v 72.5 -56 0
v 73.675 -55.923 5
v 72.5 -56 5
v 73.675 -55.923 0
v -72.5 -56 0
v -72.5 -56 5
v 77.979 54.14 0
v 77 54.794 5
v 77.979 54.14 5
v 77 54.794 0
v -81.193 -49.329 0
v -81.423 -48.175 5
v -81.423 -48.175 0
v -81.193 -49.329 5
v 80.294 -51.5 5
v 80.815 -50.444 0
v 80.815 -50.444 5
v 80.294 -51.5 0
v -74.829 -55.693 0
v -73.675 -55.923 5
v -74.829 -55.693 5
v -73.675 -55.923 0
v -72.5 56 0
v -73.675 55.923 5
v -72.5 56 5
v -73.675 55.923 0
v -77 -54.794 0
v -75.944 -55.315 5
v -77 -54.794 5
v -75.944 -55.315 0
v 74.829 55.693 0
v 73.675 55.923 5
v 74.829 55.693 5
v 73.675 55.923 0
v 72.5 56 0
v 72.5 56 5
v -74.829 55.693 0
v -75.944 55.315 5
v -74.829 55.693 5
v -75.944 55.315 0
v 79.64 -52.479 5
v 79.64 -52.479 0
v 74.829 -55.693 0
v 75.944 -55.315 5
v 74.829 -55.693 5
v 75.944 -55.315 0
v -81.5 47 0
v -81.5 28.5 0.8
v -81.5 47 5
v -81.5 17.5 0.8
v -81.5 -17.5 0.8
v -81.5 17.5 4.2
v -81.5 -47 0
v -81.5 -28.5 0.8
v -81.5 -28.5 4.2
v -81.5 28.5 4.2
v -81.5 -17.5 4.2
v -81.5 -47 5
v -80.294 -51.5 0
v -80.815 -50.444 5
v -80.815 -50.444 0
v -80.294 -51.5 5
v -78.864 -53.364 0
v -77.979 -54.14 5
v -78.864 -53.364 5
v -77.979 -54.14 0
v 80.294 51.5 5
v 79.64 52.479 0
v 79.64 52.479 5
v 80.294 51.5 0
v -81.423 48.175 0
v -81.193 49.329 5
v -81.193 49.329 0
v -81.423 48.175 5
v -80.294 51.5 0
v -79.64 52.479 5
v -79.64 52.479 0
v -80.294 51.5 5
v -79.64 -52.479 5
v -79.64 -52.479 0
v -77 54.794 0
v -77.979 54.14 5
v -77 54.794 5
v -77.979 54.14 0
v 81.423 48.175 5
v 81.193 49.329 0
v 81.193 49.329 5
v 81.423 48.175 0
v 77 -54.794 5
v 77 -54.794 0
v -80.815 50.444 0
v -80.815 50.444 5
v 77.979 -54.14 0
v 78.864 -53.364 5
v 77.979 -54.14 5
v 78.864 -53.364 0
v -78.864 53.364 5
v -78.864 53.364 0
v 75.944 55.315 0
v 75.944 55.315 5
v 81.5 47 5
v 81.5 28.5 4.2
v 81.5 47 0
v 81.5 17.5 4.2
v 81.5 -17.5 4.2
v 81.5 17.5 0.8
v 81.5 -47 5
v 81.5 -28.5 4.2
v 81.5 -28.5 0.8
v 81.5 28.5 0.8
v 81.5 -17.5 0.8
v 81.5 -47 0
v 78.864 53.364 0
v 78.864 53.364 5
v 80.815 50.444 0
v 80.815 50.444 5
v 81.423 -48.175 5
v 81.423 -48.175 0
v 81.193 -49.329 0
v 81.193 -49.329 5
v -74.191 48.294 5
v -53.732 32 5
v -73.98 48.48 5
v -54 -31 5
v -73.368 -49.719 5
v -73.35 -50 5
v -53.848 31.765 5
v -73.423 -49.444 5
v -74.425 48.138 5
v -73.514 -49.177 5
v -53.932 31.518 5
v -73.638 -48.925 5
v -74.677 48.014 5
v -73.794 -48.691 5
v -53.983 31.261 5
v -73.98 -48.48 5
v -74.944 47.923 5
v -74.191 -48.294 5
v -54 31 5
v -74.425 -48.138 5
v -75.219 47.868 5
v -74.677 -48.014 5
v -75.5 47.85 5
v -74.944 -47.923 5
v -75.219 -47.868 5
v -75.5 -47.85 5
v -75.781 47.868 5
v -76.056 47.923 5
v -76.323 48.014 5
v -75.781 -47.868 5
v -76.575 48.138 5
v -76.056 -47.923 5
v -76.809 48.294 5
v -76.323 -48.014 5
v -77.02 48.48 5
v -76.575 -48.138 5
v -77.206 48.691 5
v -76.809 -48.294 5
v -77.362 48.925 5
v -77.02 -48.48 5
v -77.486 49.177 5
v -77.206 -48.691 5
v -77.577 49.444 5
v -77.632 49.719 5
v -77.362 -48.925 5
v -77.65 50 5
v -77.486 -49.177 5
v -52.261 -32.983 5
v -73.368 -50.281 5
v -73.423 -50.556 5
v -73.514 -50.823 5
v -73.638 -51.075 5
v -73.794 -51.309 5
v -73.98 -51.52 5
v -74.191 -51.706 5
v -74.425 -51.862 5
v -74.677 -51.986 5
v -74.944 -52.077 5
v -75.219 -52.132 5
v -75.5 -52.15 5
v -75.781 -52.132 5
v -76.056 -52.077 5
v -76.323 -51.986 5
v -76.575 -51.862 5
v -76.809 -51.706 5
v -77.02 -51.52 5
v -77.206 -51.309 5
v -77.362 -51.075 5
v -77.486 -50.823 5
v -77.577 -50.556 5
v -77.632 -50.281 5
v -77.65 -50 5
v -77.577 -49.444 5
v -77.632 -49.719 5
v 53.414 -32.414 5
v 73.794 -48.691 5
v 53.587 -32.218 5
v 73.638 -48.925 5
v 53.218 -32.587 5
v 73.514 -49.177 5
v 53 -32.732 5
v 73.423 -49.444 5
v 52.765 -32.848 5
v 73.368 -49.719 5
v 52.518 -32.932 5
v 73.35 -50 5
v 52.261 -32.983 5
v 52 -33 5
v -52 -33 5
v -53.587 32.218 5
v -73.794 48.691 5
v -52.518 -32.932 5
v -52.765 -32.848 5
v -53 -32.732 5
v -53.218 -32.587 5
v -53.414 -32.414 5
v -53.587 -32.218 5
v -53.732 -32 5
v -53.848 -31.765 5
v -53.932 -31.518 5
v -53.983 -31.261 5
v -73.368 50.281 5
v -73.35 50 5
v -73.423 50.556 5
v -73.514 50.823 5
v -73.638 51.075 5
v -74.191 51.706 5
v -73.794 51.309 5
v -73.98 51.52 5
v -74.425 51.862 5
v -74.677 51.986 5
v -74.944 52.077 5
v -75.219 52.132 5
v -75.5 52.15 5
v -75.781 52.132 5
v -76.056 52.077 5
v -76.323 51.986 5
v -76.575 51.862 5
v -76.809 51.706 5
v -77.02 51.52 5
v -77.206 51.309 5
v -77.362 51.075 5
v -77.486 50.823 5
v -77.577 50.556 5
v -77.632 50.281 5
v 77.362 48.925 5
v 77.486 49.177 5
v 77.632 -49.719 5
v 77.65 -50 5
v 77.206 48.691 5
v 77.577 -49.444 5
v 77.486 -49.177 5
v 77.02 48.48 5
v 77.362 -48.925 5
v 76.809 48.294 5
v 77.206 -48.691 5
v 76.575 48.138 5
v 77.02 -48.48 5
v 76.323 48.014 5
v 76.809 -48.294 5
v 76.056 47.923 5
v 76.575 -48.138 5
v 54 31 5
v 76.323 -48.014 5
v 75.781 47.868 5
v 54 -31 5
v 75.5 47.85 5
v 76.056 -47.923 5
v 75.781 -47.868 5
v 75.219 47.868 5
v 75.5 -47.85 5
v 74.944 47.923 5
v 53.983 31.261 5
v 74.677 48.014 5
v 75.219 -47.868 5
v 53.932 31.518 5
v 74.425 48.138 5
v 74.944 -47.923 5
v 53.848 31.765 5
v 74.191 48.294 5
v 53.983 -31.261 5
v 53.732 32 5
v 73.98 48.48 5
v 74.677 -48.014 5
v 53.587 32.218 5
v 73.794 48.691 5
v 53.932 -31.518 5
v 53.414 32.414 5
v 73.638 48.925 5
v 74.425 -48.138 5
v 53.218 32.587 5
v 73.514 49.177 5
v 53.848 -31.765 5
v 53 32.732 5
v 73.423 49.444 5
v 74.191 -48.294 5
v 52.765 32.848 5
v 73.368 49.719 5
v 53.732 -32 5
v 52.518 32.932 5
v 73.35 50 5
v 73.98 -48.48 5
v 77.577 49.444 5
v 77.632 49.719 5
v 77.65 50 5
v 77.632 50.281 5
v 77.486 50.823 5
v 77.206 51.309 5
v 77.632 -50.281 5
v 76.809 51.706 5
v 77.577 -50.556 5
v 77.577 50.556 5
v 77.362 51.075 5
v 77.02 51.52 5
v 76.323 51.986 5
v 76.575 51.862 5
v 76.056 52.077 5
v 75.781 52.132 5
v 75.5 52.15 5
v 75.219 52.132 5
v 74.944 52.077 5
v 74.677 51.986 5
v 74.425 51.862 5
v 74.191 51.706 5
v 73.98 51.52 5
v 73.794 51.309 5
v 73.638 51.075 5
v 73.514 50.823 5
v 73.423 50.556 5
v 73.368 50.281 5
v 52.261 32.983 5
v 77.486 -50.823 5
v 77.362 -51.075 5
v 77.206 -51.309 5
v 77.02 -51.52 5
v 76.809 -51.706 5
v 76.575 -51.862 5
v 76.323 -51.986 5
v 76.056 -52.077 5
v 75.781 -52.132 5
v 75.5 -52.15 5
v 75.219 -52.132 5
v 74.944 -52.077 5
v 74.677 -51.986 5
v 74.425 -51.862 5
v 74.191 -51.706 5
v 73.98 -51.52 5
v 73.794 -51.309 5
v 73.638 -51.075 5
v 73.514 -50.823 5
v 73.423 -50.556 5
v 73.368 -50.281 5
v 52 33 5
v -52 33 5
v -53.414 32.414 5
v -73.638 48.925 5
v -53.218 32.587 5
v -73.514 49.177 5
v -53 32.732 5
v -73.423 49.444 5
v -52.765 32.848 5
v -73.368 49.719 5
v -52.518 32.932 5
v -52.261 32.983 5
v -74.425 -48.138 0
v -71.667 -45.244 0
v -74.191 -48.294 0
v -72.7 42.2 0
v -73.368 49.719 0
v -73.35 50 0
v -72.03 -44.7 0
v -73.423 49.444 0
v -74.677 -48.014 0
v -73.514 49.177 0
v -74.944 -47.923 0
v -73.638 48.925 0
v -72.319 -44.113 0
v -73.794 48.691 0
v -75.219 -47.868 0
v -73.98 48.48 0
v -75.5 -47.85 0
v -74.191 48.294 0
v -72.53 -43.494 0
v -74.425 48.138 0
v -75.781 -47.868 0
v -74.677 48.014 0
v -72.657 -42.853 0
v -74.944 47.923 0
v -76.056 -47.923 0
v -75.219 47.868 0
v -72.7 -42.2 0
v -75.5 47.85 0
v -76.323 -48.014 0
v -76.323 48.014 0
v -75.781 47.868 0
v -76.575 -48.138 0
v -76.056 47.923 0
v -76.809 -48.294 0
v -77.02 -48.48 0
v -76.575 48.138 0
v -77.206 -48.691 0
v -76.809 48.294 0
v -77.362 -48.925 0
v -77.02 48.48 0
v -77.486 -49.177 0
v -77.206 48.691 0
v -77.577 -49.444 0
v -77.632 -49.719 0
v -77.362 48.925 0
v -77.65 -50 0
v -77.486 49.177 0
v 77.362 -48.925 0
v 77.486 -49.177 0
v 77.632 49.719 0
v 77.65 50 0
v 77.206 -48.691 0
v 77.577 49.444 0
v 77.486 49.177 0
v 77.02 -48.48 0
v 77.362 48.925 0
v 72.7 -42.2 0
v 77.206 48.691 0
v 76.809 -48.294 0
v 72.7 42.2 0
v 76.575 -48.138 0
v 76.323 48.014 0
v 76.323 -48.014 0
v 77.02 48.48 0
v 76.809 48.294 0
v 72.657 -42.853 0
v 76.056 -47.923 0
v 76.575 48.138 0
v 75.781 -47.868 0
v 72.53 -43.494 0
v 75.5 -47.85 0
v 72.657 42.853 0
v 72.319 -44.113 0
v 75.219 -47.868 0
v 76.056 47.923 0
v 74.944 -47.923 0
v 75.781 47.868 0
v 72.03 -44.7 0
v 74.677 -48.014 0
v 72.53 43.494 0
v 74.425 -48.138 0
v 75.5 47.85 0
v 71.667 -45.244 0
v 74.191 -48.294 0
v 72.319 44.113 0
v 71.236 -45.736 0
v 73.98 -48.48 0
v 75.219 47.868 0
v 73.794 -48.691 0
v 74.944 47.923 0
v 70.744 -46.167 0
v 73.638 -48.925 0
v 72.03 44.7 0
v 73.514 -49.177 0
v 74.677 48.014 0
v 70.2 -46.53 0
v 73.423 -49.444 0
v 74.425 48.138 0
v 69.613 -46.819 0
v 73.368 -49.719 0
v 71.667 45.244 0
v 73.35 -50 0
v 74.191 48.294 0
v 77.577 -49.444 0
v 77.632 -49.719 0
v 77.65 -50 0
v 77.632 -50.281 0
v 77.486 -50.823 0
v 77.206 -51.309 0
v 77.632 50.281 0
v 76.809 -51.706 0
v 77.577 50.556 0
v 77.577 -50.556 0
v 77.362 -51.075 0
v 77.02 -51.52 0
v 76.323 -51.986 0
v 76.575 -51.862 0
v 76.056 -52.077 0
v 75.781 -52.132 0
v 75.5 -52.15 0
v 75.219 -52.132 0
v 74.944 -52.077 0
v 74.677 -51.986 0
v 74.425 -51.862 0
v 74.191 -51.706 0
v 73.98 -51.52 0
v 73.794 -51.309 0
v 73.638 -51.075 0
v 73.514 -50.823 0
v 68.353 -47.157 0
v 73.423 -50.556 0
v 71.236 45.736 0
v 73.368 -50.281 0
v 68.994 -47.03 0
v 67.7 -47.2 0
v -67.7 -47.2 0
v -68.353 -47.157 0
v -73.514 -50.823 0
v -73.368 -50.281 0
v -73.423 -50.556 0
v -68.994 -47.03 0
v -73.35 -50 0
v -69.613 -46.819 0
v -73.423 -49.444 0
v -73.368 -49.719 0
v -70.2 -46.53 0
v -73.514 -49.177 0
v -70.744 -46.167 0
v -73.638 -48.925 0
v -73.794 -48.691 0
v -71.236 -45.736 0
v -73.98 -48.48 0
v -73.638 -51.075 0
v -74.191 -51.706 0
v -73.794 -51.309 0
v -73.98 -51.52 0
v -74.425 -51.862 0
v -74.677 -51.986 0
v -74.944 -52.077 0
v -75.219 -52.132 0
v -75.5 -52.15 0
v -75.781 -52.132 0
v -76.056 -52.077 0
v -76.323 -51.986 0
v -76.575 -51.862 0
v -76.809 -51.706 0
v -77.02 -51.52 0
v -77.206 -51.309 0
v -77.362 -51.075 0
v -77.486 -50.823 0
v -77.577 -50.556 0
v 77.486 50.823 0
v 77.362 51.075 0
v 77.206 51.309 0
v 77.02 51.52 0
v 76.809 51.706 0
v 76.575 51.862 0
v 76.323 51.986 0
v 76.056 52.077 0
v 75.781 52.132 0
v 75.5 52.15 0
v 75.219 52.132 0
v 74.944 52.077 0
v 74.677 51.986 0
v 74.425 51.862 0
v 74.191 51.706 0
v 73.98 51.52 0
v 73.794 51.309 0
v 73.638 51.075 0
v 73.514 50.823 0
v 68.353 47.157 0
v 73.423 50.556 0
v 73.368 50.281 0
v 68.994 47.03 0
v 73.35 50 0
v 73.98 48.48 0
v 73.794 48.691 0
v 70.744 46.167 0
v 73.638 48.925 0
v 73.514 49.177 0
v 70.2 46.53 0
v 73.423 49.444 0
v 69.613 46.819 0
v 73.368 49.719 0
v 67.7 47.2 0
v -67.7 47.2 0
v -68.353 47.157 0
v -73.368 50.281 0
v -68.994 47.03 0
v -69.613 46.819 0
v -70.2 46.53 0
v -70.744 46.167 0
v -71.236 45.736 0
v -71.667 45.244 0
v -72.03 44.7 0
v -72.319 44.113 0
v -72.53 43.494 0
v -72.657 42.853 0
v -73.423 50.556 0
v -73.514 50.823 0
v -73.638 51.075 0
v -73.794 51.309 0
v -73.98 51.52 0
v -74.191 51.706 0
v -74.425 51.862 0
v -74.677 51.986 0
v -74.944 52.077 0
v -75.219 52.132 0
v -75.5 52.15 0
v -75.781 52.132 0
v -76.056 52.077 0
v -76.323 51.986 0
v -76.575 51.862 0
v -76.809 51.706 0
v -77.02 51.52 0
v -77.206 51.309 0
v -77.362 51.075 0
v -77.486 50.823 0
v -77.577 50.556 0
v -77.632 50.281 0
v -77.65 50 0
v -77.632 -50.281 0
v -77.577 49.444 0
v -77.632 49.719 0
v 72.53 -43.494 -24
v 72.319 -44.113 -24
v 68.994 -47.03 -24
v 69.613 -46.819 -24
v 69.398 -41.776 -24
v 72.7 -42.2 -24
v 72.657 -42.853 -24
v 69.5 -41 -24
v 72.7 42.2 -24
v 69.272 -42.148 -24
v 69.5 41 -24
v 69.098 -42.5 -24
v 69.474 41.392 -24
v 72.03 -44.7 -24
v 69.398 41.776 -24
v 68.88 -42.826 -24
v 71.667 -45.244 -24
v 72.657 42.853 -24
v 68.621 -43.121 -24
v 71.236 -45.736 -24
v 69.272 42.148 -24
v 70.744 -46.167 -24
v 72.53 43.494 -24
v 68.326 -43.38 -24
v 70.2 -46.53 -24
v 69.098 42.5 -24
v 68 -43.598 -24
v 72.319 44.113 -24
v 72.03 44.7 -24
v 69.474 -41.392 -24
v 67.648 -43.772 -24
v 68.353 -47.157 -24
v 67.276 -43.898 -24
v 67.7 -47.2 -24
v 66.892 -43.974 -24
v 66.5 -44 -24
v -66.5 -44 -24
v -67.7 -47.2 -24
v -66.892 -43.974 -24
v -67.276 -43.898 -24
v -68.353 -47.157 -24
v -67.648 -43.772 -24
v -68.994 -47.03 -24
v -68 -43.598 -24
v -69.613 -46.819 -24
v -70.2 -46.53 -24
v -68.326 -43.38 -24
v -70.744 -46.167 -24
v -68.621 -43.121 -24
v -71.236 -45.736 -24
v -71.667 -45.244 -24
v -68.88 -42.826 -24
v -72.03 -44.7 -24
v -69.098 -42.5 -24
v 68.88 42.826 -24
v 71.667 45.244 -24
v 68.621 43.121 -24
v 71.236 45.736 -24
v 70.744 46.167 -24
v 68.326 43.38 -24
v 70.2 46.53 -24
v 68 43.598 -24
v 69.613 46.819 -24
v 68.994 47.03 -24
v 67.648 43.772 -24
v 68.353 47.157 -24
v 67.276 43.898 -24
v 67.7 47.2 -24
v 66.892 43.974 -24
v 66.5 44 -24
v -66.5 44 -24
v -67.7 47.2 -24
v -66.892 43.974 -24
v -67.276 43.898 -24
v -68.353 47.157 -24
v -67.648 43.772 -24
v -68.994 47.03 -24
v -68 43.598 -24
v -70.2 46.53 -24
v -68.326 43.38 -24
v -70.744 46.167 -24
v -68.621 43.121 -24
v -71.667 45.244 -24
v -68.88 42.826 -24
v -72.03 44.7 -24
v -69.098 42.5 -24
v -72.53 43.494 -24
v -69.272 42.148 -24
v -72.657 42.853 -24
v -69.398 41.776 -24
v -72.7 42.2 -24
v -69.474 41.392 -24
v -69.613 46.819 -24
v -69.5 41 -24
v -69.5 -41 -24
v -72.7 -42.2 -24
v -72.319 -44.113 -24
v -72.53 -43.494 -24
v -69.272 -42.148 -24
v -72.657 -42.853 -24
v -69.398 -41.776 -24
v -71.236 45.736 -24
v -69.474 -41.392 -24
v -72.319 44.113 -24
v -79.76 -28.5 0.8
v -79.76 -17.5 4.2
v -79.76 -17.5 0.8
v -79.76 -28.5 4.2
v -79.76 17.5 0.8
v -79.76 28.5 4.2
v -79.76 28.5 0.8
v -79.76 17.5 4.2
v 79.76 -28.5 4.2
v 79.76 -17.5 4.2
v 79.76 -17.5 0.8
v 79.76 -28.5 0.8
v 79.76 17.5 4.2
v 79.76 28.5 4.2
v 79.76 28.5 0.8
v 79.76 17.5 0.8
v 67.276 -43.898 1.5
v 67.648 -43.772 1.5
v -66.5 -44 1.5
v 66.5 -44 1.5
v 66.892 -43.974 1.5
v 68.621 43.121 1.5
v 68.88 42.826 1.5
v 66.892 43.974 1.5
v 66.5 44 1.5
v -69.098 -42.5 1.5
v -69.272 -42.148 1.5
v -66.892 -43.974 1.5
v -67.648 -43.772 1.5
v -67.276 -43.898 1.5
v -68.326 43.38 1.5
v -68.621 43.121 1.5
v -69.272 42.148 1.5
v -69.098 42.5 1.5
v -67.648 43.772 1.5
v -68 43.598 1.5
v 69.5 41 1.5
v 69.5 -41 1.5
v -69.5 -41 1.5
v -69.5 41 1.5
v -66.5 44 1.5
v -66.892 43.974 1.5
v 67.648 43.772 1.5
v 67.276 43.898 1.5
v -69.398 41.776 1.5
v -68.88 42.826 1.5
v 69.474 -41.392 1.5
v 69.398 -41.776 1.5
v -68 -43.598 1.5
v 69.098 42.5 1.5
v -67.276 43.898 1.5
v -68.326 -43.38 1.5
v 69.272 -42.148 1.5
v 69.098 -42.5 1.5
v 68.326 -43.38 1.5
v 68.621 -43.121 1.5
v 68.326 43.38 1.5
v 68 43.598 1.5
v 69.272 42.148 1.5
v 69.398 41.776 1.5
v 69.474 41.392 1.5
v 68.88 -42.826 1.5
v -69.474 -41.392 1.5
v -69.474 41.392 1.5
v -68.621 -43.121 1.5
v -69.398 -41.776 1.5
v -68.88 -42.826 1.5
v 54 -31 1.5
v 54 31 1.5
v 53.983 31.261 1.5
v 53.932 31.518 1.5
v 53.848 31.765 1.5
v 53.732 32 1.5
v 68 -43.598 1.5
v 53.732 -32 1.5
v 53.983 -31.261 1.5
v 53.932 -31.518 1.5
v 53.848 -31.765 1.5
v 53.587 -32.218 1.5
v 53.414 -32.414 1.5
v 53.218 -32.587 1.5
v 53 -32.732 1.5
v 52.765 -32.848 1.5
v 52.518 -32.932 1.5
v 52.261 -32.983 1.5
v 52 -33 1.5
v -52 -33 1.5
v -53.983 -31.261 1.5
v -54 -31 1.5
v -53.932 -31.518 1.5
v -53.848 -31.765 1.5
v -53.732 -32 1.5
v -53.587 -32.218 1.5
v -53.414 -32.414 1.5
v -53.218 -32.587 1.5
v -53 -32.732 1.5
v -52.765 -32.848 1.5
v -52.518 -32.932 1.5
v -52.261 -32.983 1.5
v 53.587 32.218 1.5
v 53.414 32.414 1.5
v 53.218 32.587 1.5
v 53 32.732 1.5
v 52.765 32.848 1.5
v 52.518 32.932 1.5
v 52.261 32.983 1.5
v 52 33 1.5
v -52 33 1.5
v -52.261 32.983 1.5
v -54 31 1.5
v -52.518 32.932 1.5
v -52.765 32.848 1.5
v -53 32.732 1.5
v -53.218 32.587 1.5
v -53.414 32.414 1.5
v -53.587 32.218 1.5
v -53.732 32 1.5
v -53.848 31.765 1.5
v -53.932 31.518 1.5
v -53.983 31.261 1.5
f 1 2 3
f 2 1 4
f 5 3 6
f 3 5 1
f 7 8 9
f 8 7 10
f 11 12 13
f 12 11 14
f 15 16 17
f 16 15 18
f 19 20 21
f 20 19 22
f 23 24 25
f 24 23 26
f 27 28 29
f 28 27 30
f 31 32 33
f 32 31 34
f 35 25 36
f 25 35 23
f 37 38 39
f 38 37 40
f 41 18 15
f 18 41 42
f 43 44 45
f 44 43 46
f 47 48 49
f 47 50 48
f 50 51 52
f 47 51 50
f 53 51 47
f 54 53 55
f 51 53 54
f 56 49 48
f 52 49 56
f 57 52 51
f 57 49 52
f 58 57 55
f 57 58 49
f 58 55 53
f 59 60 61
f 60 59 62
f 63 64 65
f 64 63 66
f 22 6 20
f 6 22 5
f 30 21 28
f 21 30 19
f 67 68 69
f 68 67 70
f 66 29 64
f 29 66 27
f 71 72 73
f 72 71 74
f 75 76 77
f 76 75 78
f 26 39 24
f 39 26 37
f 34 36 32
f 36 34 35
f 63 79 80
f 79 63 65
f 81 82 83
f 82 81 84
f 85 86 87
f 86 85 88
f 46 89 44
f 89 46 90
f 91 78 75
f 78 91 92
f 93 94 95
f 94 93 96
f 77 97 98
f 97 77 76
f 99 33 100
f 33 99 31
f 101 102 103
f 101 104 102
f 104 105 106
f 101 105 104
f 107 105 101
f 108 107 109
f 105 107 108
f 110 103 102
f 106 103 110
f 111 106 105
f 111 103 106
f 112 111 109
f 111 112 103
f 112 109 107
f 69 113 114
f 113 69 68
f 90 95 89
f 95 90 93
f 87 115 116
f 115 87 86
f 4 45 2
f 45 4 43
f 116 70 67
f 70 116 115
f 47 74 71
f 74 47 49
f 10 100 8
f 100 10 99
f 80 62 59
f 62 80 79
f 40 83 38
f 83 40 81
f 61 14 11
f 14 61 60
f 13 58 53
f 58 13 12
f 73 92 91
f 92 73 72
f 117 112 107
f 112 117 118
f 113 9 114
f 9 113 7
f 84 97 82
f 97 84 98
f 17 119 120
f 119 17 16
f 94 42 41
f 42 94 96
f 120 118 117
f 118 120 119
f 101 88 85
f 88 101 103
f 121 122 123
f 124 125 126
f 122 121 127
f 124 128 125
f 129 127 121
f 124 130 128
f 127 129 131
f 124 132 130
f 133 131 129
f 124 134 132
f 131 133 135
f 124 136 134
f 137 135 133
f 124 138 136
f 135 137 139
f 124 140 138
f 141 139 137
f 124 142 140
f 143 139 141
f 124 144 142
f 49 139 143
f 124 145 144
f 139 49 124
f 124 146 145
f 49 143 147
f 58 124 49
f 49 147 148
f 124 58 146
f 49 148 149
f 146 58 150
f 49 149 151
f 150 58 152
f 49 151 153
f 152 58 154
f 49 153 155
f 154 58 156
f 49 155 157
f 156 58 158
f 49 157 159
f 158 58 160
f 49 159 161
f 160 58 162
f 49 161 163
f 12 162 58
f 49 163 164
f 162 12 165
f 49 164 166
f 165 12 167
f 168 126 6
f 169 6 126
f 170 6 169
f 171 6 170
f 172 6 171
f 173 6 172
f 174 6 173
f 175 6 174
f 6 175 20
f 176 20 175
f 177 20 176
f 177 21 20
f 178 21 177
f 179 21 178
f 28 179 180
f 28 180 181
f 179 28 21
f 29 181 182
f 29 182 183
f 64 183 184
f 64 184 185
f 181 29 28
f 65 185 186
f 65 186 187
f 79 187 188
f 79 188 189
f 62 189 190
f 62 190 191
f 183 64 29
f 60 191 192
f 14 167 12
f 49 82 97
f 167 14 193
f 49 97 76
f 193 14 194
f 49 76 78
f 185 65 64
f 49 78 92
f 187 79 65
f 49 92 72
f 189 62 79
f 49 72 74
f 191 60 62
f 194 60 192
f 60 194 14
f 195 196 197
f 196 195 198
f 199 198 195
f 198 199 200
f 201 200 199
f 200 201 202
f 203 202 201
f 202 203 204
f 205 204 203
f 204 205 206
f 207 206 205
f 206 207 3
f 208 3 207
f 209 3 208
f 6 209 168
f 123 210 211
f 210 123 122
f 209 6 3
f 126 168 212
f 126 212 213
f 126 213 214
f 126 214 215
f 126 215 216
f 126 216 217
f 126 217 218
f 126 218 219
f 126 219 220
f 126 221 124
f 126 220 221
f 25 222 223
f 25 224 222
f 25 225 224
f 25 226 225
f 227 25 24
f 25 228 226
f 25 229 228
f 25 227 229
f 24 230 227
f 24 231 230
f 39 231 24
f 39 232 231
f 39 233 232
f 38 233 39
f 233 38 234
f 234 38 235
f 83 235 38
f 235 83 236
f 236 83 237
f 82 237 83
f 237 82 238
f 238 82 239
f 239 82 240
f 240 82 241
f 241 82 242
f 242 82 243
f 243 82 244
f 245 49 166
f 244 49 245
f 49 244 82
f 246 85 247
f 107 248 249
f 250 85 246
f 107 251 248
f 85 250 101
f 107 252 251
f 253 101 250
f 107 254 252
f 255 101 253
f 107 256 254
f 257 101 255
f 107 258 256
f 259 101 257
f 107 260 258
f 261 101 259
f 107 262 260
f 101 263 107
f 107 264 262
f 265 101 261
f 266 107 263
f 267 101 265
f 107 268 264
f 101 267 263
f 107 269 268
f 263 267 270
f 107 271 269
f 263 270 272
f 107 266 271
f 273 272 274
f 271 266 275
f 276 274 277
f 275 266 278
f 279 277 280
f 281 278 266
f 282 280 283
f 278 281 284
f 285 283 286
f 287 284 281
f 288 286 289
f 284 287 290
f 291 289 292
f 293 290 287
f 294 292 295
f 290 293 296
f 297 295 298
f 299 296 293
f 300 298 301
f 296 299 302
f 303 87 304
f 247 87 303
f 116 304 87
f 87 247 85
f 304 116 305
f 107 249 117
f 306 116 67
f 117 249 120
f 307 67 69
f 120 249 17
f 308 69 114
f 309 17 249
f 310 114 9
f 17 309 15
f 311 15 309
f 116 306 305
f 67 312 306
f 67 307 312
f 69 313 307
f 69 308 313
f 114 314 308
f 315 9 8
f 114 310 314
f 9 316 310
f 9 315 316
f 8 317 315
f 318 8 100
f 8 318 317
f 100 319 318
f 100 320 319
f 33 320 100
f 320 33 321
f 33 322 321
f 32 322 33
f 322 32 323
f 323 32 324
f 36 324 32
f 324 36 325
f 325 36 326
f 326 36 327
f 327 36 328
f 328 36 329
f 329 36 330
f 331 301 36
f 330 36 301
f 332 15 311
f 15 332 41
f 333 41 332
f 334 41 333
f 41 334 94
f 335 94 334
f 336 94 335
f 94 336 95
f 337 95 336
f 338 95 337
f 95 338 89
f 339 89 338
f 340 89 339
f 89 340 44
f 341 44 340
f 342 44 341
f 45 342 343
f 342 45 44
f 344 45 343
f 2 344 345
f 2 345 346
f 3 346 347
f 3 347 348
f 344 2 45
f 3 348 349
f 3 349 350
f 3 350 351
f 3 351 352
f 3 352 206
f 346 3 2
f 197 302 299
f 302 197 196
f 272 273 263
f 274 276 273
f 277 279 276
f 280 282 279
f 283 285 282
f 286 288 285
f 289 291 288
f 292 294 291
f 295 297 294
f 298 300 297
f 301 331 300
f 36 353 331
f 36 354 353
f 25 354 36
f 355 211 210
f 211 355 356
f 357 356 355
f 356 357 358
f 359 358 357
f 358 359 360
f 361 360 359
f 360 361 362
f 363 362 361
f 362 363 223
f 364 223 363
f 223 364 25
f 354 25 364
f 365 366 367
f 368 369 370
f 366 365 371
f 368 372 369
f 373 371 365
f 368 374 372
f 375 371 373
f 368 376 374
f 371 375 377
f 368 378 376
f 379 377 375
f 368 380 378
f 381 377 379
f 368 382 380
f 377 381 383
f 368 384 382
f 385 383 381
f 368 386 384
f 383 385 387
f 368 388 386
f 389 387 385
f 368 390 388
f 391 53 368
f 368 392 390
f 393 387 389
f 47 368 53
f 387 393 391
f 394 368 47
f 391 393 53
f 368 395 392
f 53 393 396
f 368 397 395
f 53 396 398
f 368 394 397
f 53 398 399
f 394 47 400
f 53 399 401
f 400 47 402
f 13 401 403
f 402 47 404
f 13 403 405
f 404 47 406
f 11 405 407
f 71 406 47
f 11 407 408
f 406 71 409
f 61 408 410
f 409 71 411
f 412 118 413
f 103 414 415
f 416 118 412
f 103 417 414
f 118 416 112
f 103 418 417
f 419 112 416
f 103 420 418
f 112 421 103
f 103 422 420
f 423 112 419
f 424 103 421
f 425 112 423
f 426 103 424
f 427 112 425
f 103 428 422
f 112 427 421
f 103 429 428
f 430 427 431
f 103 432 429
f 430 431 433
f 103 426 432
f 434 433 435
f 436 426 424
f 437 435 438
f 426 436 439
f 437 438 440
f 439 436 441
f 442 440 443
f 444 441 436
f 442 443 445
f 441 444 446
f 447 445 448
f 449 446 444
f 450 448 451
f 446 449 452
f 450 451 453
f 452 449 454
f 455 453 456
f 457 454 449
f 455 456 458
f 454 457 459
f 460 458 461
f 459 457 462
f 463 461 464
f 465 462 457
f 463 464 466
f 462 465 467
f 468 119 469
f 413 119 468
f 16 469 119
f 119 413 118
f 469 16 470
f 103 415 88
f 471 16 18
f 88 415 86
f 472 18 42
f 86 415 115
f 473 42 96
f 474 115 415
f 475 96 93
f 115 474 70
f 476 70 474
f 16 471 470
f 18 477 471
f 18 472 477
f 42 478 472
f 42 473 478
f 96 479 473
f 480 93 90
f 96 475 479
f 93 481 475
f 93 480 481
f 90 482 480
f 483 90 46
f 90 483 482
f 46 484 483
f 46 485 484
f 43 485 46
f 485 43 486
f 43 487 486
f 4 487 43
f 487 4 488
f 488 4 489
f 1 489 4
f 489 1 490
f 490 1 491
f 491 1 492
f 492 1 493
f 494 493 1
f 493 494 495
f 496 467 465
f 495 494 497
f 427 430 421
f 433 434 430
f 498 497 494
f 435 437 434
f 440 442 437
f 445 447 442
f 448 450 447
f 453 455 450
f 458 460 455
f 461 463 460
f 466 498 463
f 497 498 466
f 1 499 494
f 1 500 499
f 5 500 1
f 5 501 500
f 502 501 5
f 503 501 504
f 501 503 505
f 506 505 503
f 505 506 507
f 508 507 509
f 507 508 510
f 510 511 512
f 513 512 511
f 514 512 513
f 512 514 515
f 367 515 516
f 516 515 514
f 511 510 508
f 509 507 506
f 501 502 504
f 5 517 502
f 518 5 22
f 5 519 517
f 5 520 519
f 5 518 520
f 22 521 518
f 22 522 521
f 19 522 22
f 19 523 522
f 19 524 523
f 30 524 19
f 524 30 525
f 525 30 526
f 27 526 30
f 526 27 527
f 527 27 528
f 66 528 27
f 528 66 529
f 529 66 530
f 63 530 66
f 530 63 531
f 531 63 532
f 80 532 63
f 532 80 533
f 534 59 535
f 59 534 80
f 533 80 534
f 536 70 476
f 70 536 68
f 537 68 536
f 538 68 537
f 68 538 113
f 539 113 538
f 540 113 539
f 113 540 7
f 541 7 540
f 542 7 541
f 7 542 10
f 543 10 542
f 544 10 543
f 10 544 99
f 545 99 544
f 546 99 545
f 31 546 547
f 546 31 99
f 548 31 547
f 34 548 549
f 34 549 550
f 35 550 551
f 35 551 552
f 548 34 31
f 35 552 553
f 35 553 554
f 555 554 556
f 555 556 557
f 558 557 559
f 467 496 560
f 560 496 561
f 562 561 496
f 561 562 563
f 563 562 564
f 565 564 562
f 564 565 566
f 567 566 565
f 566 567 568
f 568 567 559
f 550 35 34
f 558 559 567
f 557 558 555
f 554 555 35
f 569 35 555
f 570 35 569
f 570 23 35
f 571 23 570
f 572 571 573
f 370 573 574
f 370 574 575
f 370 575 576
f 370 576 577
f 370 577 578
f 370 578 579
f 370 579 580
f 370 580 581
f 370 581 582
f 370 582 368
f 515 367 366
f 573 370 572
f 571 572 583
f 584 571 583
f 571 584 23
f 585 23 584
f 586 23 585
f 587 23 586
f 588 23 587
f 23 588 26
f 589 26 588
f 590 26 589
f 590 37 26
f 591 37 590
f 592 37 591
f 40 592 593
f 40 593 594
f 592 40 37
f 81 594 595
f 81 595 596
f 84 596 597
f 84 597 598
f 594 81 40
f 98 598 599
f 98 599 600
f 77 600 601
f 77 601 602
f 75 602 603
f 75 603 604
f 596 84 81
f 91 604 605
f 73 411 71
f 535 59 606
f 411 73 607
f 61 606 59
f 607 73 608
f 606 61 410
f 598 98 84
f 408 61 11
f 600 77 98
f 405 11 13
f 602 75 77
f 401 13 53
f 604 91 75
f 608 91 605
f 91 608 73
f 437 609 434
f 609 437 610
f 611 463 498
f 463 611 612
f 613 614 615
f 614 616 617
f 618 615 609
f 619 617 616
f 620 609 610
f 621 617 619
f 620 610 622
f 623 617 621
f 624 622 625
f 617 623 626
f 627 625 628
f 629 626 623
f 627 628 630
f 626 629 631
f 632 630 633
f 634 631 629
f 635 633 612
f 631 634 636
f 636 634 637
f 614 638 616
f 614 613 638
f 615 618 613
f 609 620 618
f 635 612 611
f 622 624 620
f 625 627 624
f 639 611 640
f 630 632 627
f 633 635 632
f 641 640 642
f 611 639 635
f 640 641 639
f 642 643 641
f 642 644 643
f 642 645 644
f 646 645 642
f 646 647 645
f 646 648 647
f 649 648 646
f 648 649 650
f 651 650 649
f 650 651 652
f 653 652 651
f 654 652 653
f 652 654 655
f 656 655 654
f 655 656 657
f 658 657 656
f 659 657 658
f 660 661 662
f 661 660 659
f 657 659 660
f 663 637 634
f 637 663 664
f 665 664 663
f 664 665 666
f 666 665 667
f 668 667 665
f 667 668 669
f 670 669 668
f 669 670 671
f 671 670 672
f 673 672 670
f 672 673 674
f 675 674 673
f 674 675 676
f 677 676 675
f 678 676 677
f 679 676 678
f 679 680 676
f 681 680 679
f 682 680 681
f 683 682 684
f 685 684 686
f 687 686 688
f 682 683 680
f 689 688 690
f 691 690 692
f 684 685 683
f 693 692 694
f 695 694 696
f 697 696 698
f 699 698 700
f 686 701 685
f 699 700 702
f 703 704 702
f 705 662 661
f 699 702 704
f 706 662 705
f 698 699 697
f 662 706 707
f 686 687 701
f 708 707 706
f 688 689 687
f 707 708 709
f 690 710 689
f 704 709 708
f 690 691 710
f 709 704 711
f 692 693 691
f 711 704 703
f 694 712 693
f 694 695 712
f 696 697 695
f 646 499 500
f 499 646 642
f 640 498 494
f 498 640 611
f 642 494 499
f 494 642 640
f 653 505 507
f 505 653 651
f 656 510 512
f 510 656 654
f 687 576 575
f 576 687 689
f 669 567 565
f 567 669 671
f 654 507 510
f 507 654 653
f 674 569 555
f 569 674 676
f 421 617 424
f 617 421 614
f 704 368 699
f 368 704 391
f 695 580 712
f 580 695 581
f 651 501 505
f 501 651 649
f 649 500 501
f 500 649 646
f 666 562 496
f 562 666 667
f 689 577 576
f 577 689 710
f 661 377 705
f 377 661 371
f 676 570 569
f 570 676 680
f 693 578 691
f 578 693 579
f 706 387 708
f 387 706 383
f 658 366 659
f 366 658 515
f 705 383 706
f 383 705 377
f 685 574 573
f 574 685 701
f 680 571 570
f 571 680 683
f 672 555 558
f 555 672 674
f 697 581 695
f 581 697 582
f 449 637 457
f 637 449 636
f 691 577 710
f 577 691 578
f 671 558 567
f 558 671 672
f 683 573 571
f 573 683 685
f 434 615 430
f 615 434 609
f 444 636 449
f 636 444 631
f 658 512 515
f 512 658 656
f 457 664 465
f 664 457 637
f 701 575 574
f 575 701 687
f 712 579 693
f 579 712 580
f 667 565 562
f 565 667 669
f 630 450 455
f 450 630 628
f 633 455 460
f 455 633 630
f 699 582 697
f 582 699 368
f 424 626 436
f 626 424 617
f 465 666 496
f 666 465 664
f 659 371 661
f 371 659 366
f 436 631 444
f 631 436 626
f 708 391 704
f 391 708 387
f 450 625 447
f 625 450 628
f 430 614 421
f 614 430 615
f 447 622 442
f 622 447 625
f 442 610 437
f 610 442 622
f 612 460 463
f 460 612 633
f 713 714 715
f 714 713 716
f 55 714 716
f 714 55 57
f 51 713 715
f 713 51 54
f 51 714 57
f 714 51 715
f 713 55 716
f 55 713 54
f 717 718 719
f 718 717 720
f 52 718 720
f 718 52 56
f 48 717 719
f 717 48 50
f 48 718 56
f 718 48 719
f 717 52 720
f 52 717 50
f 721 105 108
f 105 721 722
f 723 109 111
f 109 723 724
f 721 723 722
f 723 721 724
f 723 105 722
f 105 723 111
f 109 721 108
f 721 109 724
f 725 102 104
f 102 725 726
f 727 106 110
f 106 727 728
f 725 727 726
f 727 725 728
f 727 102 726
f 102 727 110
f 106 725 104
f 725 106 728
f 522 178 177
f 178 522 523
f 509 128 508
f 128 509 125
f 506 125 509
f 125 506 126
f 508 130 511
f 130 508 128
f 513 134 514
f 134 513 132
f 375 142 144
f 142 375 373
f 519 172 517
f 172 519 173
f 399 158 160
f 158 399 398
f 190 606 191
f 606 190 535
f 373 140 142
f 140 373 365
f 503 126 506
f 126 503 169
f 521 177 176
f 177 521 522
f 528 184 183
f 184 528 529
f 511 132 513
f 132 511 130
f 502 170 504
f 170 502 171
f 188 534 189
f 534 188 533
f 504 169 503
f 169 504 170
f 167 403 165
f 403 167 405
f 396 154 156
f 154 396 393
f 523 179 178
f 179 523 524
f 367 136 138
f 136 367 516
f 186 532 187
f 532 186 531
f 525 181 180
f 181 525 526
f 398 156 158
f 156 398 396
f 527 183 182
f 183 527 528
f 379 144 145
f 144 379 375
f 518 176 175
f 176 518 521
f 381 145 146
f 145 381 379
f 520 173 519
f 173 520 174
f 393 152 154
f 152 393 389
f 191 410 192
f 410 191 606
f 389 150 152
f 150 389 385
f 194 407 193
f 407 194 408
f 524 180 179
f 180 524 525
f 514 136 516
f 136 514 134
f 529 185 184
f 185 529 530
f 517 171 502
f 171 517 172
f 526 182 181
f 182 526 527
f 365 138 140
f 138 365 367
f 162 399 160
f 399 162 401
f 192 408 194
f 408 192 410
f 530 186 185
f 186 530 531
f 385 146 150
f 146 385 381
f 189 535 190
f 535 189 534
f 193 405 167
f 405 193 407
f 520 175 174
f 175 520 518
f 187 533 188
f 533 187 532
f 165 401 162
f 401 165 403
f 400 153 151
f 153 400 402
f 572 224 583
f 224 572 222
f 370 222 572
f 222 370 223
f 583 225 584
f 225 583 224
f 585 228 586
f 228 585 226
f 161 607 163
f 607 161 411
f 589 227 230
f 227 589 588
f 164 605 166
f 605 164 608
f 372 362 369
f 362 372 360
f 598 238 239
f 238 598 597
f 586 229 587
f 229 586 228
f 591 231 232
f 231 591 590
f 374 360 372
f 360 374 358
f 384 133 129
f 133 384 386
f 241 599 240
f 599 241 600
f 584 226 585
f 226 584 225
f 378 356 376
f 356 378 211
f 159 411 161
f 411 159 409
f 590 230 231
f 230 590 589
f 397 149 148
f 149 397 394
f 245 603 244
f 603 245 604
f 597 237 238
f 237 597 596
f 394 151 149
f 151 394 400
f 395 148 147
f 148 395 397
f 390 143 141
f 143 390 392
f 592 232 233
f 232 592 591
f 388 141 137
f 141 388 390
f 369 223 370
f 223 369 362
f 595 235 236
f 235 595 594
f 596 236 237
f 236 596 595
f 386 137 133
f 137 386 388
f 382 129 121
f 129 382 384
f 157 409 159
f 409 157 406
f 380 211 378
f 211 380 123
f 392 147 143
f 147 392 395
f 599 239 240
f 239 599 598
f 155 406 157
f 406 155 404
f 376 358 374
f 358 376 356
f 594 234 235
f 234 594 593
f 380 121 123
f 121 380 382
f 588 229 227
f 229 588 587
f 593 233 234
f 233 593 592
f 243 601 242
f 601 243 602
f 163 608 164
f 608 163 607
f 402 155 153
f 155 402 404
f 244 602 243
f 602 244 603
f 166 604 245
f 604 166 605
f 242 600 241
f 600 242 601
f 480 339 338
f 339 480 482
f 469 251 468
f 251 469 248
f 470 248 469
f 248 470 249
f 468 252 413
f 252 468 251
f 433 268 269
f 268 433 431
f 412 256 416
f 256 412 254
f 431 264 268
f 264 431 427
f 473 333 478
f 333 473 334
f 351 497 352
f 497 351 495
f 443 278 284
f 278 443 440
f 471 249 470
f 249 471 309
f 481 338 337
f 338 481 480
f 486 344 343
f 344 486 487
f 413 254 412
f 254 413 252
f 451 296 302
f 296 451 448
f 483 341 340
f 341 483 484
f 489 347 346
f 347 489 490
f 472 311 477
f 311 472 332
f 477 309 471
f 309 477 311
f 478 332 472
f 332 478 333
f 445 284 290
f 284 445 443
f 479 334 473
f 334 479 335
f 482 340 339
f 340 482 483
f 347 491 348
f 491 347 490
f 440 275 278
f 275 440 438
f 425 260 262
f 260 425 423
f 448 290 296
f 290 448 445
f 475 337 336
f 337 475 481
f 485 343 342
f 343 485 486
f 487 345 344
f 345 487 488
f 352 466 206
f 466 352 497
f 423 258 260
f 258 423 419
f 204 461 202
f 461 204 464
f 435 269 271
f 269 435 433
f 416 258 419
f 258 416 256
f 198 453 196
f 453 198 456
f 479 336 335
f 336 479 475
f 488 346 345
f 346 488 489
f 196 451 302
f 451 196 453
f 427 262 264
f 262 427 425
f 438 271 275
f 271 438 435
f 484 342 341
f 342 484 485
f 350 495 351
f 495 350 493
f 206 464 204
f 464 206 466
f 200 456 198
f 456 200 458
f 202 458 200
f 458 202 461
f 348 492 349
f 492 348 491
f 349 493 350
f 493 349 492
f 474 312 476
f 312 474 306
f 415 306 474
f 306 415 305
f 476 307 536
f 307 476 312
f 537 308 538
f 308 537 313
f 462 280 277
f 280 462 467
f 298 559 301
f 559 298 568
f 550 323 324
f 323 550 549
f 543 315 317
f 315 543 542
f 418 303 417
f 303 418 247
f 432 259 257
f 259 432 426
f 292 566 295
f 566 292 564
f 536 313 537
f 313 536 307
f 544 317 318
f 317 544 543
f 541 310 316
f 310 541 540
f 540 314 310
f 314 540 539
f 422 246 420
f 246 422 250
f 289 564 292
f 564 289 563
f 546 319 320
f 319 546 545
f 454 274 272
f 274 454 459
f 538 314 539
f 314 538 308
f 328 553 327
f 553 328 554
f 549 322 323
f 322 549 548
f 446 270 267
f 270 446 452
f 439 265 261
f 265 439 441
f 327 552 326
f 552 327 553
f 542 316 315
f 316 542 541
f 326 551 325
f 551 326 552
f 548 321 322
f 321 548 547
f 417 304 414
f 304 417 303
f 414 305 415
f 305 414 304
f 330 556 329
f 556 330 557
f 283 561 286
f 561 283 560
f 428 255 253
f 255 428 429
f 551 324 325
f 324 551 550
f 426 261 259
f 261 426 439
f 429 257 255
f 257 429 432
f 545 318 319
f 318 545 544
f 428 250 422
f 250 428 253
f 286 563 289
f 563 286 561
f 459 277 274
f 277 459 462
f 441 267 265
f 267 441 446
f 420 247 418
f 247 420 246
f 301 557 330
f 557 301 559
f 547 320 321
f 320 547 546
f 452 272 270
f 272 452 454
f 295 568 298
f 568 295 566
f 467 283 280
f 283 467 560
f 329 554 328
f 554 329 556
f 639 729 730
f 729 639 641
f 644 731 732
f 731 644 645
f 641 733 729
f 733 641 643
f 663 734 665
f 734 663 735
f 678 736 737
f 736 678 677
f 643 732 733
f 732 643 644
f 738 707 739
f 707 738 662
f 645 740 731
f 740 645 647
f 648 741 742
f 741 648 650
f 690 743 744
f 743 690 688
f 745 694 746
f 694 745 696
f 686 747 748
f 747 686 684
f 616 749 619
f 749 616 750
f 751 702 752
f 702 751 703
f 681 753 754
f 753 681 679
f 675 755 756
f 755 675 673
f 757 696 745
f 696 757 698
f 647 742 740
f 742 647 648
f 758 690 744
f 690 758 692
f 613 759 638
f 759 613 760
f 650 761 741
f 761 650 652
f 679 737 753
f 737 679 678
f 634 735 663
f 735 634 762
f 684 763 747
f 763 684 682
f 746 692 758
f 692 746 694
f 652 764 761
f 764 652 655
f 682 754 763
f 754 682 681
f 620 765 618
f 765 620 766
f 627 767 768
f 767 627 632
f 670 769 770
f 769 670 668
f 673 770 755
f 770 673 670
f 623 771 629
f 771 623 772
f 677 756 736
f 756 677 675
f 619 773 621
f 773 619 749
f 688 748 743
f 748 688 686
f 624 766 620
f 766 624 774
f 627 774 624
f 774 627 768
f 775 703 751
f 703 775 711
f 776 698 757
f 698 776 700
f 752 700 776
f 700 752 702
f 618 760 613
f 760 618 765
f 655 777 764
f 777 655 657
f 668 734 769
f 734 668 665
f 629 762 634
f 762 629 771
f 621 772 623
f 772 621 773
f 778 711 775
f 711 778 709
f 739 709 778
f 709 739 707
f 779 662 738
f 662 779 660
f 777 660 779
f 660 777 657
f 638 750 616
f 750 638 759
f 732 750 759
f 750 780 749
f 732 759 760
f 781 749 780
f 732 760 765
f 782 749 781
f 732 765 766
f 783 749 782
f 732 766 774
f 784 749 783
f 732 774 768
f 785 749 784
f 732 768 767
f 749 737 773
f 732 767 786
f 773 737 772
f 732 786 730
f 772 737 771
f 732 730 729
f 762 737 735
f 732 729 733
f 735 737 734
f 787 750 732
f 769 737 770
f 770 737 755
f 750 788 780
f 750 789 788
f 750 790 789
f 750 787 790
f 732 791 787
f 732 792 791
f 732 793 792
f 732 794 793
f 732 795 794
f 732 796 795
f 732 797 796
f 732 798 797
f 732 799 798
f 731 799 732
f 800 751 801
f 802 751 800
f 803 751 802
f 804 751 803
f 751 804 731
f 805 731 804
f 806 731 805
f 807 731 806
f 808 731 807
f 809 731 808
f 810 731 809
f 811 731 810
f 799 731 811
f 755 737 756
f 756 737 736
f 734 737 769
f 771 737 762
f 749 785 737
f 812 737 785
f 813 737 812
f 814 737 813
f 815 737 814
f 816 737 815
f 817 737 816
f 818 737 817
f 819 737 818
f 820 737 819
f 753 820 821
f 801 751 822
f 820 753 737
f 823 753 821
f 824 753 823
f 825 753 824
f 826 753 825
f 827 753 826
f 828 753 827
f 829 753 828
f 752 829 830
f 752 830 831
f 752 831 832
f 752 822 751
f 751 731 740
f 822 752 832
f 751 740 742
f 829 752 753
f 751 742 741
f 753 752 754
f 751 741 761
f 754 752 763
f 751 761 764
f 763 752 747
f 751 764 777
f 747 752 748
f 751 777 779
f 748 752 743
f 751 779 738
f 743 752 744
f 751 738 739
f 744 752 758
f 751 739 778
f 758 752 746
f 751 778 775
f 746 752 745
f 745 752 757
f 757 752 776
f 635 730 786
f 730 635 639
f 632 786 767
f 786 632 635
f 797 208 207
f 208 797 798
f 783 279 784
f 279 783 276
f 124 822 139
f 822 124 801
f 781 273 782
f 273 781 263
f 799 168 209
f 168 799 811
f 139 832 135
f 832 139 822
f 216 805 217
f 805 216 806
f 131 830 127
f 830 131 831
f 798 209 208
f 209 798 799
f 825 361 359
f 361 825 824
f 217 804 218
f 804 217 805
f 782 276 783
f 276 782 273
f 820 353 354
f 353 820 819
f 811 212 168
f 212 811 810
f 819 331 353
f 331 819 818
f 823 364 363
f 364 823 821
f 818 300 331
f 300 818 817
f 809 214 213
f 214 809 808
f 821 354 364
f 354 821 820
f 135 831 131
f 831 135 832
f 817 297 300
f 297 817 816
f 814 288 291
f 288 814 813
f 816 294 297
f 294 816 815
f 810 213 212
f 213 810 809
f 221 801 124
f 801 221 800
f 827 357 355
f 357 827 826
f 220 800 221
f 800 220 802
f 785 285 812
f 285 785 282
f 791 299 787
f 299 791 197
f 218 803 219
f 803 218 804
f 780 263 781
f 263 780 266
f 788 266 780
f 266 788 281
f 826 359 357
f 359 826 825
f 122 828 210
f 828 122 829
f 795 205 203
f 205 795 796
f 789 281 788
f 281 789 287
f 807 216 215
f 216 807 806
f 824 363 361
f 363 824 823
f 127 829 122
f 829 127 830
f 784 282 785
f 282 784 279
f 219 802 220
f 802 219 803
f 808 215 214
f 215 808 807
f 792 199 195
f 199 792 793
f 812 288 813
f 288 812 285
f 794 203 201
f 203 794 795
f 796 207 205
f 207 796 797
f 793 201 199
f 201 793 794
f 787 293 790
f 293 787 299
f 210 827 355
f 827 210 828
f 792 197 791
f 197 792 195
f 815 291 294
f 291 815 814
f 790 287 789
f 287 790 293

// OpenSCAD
/* VMAX in-dash mount V1: provisional mm dimensions; verify actual hardware. */
$fn=48;part="mount";
module_w=137;module_h=86;visible_w=108;visible_h=66;
fit_clearance=1;bezel_border=12;bezel_thick=5;
sleeve_depth=24;sleeve_wall=3.2;corner_r=9;
snap_offset_y=23;snap_slot_height=11;snap_slot_depth=1.6;snap_slot_width=3.4;
mount_hole_d=4.3;mount_inset=6;
outer_w=module_w+2*(fit_clearance+bezel_border);
outer_h=module_h+2*(fit_clearance+bezel_border);
sleeve_w=module_w+2*(fit_clearance+sleeve_wall);
sleeve_h=module_h+2*(fit_clearance+sleeve_wall);
module rr(w,h,r){offset(r=r)square([w-2*r,h-2*r],center=true);}
module mount(){difference(){union(){
 linear_extrude(height=bezel_thick)rr(outer_w,outer_h,corner_r);
 translate([0,0,-sleeve_depth])linear_extrude(height=sleeve_depth)rr(sleeve_w,sleeve_h,5);
}
translate([0,0,-sleeve_depth-.1])linear_extrude(height=sleeve_depth+1.6)
 rr(module_w+2*fit_clearance,module_h+2*fit_clearance,3);
translate([0,0,1.4])linear_extrude(height=bezel_thick+1)
 rr(visible_w,visible_h,2);
for(side=[-1,1],yy=[-snap_offset_y,snap_offset_y])
 translate([side*(outer_w/2-snap_slot_depth/2+.01),yy,bezel_thick/2])
 cube([snap_slot_depth+.3,snap_slot_height,snap_slot_width],center=true);
for(xx=[-1,1],yy=[-1,1])
 translate([xx*(outer_w/2-mount_inset),yy*(outer_h/2-mount_inset),-.1])
 cylinder(h=bezel_thick+.3,d=mount_hole_d);
}}
if(part=="mount")mount();
